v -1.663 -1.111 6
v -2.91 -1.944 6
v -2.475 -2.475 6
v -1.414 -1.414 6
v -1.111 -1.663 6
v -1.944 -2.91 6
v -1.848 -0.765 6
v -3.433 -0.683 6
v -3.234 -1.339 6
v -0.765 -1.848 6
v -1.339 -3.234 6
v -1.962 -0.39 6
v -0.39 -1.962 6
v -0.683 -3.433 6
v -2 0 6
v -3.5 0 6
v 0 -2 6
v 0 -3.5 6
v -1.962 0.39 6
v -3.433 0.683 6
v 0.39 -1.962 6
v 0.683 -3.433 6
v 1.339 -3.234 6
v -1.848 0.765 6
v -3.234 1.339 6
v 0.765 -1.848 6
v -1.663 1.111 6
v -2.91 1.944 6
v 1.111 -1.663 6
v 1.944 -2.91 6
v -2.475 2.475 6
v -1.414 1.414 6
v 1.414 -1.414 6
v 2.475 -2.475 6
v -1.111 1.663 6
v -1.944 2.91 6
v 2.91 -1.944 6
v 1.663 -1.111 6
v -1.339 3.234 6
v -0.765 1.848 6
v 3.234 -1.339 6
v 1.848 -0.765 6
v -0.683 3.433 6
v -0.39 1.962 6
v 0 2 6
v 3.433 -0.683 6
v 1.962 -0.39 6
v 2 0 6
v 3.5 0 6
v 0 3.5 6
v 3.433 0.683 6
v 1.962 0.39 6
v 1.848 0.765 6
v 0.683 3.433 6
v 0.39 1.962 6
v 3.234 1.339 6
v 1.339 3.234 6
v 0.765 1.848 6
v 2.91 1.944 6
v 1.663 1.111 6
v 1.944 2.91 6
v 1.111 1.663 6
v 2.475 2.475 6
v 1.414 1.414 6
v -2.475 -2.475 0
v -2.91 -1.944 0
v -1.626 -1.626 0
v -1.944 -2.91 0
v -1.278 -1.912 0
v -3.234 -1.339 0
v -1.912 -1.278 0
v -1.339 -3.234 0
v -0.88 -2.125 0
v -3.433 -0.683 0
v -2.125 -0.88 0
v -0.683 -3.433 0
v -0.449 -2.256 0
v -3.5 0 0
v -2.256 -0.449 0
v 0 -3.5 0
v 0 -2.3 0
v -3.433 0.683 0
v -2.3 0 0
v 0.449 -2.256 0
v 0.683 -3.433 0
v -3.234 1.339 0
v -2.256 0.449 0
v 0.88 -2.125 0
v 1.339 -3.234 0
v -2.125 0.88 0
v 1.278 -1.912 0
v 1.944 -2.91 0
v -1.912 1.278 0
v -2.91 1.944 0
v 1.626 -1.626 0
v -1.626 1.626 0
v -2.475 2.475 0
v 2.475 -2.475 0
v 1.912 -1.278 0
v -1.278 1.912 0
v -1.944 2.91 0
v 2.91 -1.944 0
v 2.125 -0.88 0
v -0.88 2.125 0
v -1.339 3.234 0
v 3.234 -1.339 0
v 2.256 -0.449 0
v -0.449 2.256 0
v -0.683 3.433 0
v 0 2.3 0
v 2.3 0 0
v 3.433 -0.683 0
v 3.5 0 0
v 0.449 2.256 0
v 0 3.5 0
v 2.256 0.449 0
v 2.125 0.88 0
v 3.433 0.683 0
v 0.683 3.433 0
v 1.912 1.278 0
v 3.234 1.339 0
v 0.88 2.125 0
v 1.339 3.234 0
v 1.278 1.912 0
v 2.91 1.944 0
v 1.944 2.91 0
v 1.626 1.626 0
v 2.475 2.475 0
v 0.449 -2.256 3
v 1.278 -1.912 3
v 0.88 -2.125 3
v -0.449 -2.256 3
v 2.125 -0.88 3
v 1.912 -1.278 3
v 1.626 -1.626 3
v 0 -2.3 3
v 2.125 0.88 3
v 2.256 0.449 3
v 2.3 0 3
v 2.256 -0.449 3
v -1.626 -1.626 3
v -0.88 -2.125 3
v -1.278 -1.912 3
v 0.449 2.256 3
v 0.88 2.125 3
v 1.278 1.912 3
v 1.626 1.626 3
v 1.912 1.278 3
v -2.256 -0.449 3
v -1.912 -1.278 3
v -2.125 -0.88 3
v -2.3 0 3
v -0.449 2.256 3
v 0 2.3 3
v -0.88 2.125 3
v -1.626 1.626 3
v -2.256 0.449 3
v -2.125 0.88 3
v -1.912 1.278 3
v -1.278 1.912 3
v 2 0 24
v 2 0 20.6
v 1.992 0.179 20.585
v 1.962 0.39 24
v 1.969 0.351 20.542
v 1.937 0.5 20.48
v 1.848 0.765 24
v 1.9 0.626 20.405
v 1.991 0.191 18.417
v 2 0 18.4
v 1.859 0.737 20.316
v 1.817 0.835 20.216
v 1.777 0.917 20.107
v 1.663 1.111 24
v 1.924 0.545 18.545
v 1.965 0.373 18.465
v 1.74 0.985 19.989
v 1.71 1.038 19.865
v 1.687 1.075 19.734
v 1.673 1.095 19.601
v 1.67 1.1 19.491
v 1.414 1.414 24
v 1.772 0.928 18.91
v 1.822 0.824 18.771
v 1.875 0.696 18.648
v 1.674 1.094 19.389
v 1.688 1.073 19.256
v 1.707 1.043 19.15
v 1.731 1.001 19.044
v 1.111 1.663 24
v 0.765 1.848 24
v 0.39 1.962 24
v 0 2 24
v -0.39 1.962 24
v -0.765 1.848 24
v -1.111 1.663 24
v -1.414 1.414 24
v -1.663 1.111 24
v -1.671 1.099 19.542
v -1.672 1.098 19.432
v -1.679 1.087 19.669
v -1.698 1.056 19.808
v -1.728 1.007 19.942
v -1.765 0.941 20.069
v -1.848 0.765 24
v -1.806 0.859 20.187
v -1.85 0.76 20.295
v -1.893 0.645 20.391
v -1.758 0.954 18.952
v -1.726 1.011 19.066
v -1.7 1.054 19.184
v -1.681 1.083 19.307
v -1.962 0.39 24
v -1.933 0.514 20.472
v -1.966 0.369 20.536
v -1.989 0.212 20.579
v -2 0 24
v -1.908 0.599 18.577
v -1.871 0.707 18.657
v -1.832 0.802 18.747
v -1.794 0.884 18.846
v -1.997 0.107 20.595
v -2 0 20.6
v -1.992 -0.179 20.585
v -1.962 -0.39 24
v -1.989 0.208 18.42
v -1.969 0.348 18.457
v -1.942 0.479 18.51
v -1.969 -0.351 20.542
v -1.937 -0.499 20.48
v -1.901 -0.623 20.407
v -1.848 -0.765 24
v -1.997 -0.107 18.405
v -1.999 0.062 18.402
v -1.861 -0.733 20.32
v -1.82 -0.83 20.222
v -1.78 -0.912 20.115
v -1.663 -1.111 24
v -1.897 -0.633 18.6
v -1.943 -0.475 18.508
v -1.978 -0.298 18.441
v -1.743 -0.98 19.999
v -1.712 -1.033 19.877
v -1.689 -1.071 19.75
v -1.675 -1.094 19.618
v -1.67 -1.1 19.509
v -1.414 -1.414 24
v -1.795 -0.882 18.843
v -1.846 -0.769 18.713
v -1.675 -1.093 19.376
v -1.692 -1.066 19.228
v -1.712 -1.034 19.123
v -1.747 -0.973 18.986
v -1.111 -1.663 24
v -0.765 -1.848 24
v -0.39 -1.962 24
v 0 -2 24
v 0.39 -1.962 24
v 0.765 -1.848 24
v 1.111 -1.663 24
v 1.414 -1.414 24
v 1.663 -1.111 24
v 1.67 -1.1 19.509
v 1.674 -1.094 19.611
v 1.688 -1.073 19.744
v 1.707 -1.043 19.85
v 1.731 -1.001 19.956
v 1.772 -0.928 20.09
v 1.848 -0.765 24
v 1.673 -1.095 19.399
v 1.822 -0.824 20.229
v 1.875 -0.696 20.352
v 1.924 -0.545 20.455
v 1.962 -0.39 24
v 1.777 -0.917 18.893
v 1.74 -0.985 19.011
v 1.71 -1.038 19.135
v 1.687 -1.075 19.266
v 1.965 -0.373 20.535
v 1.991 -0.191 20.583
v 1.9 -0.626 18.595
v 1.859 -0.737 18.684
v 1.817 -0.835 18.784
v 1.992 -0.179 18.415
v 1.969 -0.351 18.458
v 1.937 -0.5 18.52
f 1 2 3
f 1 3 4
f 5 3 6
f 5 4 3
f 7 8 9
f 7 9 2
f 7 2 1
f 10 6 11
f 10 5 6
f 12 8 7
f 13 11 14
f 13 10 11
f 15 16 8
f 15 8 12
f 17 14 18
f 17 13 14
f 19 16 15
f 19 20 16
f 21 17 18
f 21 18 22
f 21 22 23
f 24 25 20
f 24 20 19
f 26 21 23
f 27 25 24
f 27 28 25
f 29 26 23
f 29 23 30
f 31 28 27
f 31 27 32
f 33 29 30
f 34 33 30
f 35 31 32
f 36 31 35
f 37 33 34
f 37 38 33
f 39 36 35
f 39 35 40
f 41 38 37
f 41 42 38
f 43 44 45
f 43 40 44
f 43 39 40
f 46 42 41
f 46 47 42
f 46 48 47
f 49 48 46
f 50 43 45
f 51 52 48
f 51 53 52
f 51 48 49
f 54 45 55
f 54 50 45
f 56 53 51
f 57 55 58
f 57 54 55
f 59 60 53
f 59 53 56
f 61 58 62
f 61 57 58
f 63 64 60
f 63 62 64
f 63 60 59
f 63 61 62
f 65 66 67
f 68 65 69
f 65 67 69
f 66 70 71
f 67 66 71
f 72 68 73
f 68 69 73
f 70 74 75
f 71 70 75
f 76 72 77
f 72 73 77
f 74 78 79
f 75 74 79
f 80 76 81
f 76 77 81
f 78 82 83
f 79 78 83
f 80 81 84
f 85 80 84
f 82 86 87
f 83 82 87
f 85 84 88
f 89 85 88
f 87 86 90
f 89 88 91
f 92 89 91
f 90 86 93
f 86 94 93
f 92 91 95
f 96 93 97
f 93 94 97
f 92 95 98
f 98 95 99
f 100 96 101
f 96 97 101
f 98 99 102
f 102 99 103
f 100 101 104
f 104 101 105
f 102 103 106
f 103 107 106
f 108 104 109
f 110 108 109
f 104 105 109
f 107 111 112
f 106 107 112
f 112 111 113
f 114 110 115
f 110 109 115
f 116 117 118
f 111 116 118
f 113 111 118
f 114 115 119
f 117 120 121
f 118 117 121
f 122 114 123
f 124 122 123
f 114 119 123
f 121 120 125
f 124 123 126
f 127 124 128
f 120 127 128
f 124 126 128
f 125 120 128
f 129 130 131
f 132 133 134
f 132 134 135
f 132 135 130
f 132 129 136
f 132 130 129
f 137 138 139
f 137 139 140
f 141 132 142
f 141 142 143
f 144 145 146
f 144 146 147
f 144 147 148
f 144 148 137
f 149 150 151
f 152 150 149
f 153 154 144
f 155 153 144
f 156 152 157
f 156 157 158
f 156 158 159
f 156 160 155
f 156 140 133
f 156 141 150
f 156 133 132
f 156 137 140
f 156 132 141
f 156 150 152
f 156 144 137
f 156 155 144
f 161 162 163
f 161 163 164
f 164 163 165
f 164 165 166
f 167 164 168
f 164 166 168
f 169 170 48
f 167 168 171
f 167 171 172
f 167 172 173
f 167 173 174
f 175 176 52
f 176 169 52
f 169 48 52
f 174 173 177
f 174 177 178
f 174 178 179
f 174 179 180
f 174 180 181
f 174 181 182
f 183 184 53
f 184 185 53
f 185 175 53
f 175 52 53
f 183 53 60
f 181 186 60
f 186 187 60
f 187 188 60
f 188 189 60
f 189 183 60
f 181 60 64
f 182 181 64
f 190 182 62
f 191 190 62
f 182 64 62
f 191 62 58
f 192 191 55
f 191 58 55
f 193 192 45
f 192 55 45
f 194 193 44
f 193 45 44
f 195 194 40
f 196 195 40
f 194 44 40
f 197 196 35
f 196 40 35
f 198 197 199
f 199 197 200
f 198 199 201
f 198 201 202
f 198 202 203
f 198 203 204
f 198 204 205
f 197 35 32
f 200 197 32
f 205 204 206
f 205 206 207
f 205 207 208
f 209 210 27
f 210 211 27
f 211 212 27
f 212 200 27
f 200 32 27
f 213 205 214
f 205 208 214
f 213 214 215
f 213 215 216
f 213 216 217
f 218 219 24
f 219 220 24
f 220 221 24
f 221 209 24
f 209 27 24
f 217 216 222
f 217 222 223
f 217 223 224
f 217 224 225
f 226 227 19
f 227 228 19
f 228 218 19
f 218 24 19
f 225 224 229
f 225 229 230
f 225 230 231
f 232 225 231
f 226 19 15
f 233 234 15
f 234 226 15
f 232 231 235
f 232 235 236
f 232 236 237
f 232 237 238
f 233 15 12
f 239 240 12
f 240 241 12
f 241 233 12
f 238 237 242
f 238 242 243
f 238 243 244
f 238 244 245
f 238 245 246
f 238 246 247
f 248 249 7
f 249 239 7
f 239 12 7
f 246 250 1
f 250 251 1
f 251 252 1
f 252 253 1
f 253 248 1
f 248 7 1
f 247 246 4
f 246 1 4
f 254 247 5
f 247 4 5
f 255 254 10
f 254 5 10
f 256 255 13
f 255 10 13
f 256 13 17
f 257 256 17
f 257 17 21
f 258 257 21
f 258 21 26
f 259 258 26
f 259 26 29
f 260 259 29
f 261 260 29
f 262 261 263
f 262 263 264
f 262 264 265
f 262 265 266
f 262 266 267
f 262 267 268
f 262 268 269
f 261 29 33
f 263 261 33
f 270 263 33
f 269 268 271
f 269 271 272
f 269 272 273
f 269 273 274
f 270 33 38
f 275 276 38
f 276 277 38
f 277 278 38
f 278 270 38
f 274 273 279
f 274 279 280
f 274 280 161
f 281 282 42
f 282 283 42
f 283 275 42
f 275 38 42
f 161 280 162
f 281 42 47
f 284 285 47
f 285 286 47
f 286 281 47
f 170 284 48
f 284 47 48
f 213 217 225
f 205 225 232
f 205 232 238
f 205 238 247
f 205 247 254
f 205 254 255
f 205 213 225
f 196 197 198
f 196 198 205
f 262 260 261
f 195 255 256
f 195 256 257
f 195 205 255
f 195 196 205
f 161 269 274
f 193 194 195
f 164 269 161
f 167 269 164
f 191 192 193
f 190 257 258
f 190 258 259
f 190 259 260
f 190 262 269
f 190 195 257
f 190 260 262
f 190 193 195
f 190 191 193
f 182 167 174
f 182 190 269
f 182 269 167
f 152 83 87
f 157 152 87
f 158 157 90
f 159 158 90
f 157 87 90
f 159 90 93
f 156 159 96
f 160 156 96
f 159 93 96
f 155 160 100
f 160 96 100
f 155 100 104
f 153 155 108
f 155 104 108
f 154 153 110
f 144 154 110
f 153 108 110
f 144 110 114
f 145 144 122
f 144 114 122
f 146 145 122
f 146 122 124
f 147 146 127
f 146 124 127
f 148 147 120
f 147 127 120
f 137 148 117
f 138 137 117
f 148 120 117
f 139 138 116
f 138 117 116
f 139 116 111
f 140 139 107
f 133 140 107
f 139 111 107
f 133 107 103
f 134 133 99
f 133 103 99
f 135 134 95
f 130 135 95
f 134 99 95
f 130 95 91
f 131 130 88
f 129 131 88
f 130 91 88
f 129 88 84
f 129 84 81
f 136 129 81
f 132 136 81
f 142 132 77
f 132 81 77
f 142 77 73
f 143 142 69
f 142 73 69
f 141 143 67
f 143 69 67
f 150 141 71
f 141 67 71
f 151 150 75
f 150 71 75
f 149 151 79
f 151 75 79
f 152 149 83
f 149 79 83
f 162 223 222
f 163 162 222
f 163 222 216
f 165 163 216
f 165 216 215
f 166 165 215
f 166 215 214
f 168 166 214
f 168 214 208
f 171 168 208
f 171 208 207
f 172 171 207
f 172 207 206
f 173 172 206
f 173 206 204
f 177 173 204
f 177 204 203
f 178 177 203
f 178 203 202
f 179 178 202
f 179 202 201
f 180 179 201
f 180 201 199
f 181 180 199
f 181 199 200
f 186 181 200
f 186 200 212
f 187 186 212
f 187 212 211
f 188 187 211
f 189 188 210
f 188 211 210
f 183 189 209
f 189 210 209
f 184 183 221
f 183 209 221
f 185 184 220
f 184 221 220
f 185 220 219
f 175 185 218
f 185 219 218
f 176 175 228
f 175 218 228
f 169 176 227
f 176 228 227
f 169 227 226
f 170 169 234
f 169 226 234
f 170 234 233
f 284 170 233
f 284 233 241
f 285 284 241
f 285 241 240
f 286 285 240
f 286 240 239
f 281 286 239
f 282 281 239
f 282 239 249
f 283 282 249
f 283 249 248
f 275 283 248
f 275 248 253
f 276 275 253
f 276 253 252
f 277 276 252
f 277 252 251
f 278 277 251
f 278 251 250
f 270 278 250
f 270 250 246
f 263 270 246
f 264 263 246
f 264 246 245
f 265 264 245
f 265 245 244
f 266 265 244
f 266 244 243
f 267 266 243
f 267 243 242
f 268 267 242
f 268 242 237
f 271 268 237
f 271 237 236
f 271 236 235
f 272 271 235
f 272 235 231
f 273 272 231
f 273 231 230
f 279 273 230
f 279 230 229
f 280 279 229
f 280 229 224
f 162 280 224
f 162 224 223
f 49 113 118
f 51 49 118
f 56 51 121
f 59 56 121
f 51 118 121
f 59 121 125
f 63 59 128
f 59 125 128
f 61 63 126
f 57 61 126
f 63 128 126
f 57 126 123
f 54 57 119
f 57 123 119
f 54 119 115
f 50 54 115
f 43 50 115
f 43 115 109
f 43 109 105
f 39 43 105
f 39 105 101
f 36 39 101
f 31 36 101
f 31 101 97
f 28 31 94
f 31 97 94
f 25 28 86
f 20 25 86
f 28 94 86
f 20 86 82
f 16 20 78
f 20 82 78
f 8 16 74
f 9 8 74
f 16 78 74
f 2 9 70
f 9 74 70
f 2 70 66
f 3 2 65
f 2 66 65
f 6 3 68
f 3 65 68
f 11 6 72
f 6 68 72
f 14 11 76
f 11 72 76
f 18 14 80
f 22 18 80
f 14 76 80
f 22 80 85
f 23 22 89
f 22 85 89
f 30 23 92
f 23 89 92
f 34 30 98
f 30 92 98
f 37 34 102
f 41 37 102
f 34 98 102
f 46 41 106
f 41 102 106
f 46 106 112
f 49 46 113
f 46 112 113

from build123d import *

# Parameters (mm, degrees)
SZKIC1_R                    = 3.5
DODANIE_WYCI_GNI_CIE1_DEPTH = 6
SZKIC2_R                    = 2
DODANIE_WYCI_GNI_CIE2_DEPTH = 18
SZKIC3_R                    = 1.1
WYTNIJ_WYCI_GNI_CIE1_DEPTH  = 6.5
SZKIC4_R                    = 2.3
WYTNIJ_WYCI_GNI_CIE2_DEPTH  = 3


with BuildPart() as part:
    # Szkic1 → Dodanie-wyciągnięcie1 (new body)
    with BuildSketch(Plane.XY):
        Circle(SZKIC1_R)
    extrude(amount=DODANIE_WYCI_GNI_CIE1_DEPTH)

    # Szkic2 → Dodanie-wyciągnięcie2 (add)
    with BuildSketch(Plane.XY.offset(6)):
        Circle(SZKIC2_R)
    extrude(amount=DODANIE_WYCI_GNI_CIE2_DEPTH)

    # Szkic3 → Wytnij-wyciągnięcie1 (cut, through all)
    with BuildSketch(Plane.ZY.offset(2)):
        with Locations((19.5, 0)):
            Circle(SZKIC3_R)
    extrude(amount=-WYTNIJ_WYCI_GNI_CIE1_DEPTH, mode=Mode.SUBTRACT)

    # Szkic4 → Wytnij-wyciągnięcie2 (cut)
    with BuildSketch(Plane(origin=(0, 0, 0), x_dir=(-1, 0, 0), z_dir=(0, 0, -1))):
        Circle(SZKIC4_R)
    extrude(amount=-WYTNIJ_WYCI_GNI_CIE2_DEPTH, mode=Mode.SUBTRACT)


solid = part.part
